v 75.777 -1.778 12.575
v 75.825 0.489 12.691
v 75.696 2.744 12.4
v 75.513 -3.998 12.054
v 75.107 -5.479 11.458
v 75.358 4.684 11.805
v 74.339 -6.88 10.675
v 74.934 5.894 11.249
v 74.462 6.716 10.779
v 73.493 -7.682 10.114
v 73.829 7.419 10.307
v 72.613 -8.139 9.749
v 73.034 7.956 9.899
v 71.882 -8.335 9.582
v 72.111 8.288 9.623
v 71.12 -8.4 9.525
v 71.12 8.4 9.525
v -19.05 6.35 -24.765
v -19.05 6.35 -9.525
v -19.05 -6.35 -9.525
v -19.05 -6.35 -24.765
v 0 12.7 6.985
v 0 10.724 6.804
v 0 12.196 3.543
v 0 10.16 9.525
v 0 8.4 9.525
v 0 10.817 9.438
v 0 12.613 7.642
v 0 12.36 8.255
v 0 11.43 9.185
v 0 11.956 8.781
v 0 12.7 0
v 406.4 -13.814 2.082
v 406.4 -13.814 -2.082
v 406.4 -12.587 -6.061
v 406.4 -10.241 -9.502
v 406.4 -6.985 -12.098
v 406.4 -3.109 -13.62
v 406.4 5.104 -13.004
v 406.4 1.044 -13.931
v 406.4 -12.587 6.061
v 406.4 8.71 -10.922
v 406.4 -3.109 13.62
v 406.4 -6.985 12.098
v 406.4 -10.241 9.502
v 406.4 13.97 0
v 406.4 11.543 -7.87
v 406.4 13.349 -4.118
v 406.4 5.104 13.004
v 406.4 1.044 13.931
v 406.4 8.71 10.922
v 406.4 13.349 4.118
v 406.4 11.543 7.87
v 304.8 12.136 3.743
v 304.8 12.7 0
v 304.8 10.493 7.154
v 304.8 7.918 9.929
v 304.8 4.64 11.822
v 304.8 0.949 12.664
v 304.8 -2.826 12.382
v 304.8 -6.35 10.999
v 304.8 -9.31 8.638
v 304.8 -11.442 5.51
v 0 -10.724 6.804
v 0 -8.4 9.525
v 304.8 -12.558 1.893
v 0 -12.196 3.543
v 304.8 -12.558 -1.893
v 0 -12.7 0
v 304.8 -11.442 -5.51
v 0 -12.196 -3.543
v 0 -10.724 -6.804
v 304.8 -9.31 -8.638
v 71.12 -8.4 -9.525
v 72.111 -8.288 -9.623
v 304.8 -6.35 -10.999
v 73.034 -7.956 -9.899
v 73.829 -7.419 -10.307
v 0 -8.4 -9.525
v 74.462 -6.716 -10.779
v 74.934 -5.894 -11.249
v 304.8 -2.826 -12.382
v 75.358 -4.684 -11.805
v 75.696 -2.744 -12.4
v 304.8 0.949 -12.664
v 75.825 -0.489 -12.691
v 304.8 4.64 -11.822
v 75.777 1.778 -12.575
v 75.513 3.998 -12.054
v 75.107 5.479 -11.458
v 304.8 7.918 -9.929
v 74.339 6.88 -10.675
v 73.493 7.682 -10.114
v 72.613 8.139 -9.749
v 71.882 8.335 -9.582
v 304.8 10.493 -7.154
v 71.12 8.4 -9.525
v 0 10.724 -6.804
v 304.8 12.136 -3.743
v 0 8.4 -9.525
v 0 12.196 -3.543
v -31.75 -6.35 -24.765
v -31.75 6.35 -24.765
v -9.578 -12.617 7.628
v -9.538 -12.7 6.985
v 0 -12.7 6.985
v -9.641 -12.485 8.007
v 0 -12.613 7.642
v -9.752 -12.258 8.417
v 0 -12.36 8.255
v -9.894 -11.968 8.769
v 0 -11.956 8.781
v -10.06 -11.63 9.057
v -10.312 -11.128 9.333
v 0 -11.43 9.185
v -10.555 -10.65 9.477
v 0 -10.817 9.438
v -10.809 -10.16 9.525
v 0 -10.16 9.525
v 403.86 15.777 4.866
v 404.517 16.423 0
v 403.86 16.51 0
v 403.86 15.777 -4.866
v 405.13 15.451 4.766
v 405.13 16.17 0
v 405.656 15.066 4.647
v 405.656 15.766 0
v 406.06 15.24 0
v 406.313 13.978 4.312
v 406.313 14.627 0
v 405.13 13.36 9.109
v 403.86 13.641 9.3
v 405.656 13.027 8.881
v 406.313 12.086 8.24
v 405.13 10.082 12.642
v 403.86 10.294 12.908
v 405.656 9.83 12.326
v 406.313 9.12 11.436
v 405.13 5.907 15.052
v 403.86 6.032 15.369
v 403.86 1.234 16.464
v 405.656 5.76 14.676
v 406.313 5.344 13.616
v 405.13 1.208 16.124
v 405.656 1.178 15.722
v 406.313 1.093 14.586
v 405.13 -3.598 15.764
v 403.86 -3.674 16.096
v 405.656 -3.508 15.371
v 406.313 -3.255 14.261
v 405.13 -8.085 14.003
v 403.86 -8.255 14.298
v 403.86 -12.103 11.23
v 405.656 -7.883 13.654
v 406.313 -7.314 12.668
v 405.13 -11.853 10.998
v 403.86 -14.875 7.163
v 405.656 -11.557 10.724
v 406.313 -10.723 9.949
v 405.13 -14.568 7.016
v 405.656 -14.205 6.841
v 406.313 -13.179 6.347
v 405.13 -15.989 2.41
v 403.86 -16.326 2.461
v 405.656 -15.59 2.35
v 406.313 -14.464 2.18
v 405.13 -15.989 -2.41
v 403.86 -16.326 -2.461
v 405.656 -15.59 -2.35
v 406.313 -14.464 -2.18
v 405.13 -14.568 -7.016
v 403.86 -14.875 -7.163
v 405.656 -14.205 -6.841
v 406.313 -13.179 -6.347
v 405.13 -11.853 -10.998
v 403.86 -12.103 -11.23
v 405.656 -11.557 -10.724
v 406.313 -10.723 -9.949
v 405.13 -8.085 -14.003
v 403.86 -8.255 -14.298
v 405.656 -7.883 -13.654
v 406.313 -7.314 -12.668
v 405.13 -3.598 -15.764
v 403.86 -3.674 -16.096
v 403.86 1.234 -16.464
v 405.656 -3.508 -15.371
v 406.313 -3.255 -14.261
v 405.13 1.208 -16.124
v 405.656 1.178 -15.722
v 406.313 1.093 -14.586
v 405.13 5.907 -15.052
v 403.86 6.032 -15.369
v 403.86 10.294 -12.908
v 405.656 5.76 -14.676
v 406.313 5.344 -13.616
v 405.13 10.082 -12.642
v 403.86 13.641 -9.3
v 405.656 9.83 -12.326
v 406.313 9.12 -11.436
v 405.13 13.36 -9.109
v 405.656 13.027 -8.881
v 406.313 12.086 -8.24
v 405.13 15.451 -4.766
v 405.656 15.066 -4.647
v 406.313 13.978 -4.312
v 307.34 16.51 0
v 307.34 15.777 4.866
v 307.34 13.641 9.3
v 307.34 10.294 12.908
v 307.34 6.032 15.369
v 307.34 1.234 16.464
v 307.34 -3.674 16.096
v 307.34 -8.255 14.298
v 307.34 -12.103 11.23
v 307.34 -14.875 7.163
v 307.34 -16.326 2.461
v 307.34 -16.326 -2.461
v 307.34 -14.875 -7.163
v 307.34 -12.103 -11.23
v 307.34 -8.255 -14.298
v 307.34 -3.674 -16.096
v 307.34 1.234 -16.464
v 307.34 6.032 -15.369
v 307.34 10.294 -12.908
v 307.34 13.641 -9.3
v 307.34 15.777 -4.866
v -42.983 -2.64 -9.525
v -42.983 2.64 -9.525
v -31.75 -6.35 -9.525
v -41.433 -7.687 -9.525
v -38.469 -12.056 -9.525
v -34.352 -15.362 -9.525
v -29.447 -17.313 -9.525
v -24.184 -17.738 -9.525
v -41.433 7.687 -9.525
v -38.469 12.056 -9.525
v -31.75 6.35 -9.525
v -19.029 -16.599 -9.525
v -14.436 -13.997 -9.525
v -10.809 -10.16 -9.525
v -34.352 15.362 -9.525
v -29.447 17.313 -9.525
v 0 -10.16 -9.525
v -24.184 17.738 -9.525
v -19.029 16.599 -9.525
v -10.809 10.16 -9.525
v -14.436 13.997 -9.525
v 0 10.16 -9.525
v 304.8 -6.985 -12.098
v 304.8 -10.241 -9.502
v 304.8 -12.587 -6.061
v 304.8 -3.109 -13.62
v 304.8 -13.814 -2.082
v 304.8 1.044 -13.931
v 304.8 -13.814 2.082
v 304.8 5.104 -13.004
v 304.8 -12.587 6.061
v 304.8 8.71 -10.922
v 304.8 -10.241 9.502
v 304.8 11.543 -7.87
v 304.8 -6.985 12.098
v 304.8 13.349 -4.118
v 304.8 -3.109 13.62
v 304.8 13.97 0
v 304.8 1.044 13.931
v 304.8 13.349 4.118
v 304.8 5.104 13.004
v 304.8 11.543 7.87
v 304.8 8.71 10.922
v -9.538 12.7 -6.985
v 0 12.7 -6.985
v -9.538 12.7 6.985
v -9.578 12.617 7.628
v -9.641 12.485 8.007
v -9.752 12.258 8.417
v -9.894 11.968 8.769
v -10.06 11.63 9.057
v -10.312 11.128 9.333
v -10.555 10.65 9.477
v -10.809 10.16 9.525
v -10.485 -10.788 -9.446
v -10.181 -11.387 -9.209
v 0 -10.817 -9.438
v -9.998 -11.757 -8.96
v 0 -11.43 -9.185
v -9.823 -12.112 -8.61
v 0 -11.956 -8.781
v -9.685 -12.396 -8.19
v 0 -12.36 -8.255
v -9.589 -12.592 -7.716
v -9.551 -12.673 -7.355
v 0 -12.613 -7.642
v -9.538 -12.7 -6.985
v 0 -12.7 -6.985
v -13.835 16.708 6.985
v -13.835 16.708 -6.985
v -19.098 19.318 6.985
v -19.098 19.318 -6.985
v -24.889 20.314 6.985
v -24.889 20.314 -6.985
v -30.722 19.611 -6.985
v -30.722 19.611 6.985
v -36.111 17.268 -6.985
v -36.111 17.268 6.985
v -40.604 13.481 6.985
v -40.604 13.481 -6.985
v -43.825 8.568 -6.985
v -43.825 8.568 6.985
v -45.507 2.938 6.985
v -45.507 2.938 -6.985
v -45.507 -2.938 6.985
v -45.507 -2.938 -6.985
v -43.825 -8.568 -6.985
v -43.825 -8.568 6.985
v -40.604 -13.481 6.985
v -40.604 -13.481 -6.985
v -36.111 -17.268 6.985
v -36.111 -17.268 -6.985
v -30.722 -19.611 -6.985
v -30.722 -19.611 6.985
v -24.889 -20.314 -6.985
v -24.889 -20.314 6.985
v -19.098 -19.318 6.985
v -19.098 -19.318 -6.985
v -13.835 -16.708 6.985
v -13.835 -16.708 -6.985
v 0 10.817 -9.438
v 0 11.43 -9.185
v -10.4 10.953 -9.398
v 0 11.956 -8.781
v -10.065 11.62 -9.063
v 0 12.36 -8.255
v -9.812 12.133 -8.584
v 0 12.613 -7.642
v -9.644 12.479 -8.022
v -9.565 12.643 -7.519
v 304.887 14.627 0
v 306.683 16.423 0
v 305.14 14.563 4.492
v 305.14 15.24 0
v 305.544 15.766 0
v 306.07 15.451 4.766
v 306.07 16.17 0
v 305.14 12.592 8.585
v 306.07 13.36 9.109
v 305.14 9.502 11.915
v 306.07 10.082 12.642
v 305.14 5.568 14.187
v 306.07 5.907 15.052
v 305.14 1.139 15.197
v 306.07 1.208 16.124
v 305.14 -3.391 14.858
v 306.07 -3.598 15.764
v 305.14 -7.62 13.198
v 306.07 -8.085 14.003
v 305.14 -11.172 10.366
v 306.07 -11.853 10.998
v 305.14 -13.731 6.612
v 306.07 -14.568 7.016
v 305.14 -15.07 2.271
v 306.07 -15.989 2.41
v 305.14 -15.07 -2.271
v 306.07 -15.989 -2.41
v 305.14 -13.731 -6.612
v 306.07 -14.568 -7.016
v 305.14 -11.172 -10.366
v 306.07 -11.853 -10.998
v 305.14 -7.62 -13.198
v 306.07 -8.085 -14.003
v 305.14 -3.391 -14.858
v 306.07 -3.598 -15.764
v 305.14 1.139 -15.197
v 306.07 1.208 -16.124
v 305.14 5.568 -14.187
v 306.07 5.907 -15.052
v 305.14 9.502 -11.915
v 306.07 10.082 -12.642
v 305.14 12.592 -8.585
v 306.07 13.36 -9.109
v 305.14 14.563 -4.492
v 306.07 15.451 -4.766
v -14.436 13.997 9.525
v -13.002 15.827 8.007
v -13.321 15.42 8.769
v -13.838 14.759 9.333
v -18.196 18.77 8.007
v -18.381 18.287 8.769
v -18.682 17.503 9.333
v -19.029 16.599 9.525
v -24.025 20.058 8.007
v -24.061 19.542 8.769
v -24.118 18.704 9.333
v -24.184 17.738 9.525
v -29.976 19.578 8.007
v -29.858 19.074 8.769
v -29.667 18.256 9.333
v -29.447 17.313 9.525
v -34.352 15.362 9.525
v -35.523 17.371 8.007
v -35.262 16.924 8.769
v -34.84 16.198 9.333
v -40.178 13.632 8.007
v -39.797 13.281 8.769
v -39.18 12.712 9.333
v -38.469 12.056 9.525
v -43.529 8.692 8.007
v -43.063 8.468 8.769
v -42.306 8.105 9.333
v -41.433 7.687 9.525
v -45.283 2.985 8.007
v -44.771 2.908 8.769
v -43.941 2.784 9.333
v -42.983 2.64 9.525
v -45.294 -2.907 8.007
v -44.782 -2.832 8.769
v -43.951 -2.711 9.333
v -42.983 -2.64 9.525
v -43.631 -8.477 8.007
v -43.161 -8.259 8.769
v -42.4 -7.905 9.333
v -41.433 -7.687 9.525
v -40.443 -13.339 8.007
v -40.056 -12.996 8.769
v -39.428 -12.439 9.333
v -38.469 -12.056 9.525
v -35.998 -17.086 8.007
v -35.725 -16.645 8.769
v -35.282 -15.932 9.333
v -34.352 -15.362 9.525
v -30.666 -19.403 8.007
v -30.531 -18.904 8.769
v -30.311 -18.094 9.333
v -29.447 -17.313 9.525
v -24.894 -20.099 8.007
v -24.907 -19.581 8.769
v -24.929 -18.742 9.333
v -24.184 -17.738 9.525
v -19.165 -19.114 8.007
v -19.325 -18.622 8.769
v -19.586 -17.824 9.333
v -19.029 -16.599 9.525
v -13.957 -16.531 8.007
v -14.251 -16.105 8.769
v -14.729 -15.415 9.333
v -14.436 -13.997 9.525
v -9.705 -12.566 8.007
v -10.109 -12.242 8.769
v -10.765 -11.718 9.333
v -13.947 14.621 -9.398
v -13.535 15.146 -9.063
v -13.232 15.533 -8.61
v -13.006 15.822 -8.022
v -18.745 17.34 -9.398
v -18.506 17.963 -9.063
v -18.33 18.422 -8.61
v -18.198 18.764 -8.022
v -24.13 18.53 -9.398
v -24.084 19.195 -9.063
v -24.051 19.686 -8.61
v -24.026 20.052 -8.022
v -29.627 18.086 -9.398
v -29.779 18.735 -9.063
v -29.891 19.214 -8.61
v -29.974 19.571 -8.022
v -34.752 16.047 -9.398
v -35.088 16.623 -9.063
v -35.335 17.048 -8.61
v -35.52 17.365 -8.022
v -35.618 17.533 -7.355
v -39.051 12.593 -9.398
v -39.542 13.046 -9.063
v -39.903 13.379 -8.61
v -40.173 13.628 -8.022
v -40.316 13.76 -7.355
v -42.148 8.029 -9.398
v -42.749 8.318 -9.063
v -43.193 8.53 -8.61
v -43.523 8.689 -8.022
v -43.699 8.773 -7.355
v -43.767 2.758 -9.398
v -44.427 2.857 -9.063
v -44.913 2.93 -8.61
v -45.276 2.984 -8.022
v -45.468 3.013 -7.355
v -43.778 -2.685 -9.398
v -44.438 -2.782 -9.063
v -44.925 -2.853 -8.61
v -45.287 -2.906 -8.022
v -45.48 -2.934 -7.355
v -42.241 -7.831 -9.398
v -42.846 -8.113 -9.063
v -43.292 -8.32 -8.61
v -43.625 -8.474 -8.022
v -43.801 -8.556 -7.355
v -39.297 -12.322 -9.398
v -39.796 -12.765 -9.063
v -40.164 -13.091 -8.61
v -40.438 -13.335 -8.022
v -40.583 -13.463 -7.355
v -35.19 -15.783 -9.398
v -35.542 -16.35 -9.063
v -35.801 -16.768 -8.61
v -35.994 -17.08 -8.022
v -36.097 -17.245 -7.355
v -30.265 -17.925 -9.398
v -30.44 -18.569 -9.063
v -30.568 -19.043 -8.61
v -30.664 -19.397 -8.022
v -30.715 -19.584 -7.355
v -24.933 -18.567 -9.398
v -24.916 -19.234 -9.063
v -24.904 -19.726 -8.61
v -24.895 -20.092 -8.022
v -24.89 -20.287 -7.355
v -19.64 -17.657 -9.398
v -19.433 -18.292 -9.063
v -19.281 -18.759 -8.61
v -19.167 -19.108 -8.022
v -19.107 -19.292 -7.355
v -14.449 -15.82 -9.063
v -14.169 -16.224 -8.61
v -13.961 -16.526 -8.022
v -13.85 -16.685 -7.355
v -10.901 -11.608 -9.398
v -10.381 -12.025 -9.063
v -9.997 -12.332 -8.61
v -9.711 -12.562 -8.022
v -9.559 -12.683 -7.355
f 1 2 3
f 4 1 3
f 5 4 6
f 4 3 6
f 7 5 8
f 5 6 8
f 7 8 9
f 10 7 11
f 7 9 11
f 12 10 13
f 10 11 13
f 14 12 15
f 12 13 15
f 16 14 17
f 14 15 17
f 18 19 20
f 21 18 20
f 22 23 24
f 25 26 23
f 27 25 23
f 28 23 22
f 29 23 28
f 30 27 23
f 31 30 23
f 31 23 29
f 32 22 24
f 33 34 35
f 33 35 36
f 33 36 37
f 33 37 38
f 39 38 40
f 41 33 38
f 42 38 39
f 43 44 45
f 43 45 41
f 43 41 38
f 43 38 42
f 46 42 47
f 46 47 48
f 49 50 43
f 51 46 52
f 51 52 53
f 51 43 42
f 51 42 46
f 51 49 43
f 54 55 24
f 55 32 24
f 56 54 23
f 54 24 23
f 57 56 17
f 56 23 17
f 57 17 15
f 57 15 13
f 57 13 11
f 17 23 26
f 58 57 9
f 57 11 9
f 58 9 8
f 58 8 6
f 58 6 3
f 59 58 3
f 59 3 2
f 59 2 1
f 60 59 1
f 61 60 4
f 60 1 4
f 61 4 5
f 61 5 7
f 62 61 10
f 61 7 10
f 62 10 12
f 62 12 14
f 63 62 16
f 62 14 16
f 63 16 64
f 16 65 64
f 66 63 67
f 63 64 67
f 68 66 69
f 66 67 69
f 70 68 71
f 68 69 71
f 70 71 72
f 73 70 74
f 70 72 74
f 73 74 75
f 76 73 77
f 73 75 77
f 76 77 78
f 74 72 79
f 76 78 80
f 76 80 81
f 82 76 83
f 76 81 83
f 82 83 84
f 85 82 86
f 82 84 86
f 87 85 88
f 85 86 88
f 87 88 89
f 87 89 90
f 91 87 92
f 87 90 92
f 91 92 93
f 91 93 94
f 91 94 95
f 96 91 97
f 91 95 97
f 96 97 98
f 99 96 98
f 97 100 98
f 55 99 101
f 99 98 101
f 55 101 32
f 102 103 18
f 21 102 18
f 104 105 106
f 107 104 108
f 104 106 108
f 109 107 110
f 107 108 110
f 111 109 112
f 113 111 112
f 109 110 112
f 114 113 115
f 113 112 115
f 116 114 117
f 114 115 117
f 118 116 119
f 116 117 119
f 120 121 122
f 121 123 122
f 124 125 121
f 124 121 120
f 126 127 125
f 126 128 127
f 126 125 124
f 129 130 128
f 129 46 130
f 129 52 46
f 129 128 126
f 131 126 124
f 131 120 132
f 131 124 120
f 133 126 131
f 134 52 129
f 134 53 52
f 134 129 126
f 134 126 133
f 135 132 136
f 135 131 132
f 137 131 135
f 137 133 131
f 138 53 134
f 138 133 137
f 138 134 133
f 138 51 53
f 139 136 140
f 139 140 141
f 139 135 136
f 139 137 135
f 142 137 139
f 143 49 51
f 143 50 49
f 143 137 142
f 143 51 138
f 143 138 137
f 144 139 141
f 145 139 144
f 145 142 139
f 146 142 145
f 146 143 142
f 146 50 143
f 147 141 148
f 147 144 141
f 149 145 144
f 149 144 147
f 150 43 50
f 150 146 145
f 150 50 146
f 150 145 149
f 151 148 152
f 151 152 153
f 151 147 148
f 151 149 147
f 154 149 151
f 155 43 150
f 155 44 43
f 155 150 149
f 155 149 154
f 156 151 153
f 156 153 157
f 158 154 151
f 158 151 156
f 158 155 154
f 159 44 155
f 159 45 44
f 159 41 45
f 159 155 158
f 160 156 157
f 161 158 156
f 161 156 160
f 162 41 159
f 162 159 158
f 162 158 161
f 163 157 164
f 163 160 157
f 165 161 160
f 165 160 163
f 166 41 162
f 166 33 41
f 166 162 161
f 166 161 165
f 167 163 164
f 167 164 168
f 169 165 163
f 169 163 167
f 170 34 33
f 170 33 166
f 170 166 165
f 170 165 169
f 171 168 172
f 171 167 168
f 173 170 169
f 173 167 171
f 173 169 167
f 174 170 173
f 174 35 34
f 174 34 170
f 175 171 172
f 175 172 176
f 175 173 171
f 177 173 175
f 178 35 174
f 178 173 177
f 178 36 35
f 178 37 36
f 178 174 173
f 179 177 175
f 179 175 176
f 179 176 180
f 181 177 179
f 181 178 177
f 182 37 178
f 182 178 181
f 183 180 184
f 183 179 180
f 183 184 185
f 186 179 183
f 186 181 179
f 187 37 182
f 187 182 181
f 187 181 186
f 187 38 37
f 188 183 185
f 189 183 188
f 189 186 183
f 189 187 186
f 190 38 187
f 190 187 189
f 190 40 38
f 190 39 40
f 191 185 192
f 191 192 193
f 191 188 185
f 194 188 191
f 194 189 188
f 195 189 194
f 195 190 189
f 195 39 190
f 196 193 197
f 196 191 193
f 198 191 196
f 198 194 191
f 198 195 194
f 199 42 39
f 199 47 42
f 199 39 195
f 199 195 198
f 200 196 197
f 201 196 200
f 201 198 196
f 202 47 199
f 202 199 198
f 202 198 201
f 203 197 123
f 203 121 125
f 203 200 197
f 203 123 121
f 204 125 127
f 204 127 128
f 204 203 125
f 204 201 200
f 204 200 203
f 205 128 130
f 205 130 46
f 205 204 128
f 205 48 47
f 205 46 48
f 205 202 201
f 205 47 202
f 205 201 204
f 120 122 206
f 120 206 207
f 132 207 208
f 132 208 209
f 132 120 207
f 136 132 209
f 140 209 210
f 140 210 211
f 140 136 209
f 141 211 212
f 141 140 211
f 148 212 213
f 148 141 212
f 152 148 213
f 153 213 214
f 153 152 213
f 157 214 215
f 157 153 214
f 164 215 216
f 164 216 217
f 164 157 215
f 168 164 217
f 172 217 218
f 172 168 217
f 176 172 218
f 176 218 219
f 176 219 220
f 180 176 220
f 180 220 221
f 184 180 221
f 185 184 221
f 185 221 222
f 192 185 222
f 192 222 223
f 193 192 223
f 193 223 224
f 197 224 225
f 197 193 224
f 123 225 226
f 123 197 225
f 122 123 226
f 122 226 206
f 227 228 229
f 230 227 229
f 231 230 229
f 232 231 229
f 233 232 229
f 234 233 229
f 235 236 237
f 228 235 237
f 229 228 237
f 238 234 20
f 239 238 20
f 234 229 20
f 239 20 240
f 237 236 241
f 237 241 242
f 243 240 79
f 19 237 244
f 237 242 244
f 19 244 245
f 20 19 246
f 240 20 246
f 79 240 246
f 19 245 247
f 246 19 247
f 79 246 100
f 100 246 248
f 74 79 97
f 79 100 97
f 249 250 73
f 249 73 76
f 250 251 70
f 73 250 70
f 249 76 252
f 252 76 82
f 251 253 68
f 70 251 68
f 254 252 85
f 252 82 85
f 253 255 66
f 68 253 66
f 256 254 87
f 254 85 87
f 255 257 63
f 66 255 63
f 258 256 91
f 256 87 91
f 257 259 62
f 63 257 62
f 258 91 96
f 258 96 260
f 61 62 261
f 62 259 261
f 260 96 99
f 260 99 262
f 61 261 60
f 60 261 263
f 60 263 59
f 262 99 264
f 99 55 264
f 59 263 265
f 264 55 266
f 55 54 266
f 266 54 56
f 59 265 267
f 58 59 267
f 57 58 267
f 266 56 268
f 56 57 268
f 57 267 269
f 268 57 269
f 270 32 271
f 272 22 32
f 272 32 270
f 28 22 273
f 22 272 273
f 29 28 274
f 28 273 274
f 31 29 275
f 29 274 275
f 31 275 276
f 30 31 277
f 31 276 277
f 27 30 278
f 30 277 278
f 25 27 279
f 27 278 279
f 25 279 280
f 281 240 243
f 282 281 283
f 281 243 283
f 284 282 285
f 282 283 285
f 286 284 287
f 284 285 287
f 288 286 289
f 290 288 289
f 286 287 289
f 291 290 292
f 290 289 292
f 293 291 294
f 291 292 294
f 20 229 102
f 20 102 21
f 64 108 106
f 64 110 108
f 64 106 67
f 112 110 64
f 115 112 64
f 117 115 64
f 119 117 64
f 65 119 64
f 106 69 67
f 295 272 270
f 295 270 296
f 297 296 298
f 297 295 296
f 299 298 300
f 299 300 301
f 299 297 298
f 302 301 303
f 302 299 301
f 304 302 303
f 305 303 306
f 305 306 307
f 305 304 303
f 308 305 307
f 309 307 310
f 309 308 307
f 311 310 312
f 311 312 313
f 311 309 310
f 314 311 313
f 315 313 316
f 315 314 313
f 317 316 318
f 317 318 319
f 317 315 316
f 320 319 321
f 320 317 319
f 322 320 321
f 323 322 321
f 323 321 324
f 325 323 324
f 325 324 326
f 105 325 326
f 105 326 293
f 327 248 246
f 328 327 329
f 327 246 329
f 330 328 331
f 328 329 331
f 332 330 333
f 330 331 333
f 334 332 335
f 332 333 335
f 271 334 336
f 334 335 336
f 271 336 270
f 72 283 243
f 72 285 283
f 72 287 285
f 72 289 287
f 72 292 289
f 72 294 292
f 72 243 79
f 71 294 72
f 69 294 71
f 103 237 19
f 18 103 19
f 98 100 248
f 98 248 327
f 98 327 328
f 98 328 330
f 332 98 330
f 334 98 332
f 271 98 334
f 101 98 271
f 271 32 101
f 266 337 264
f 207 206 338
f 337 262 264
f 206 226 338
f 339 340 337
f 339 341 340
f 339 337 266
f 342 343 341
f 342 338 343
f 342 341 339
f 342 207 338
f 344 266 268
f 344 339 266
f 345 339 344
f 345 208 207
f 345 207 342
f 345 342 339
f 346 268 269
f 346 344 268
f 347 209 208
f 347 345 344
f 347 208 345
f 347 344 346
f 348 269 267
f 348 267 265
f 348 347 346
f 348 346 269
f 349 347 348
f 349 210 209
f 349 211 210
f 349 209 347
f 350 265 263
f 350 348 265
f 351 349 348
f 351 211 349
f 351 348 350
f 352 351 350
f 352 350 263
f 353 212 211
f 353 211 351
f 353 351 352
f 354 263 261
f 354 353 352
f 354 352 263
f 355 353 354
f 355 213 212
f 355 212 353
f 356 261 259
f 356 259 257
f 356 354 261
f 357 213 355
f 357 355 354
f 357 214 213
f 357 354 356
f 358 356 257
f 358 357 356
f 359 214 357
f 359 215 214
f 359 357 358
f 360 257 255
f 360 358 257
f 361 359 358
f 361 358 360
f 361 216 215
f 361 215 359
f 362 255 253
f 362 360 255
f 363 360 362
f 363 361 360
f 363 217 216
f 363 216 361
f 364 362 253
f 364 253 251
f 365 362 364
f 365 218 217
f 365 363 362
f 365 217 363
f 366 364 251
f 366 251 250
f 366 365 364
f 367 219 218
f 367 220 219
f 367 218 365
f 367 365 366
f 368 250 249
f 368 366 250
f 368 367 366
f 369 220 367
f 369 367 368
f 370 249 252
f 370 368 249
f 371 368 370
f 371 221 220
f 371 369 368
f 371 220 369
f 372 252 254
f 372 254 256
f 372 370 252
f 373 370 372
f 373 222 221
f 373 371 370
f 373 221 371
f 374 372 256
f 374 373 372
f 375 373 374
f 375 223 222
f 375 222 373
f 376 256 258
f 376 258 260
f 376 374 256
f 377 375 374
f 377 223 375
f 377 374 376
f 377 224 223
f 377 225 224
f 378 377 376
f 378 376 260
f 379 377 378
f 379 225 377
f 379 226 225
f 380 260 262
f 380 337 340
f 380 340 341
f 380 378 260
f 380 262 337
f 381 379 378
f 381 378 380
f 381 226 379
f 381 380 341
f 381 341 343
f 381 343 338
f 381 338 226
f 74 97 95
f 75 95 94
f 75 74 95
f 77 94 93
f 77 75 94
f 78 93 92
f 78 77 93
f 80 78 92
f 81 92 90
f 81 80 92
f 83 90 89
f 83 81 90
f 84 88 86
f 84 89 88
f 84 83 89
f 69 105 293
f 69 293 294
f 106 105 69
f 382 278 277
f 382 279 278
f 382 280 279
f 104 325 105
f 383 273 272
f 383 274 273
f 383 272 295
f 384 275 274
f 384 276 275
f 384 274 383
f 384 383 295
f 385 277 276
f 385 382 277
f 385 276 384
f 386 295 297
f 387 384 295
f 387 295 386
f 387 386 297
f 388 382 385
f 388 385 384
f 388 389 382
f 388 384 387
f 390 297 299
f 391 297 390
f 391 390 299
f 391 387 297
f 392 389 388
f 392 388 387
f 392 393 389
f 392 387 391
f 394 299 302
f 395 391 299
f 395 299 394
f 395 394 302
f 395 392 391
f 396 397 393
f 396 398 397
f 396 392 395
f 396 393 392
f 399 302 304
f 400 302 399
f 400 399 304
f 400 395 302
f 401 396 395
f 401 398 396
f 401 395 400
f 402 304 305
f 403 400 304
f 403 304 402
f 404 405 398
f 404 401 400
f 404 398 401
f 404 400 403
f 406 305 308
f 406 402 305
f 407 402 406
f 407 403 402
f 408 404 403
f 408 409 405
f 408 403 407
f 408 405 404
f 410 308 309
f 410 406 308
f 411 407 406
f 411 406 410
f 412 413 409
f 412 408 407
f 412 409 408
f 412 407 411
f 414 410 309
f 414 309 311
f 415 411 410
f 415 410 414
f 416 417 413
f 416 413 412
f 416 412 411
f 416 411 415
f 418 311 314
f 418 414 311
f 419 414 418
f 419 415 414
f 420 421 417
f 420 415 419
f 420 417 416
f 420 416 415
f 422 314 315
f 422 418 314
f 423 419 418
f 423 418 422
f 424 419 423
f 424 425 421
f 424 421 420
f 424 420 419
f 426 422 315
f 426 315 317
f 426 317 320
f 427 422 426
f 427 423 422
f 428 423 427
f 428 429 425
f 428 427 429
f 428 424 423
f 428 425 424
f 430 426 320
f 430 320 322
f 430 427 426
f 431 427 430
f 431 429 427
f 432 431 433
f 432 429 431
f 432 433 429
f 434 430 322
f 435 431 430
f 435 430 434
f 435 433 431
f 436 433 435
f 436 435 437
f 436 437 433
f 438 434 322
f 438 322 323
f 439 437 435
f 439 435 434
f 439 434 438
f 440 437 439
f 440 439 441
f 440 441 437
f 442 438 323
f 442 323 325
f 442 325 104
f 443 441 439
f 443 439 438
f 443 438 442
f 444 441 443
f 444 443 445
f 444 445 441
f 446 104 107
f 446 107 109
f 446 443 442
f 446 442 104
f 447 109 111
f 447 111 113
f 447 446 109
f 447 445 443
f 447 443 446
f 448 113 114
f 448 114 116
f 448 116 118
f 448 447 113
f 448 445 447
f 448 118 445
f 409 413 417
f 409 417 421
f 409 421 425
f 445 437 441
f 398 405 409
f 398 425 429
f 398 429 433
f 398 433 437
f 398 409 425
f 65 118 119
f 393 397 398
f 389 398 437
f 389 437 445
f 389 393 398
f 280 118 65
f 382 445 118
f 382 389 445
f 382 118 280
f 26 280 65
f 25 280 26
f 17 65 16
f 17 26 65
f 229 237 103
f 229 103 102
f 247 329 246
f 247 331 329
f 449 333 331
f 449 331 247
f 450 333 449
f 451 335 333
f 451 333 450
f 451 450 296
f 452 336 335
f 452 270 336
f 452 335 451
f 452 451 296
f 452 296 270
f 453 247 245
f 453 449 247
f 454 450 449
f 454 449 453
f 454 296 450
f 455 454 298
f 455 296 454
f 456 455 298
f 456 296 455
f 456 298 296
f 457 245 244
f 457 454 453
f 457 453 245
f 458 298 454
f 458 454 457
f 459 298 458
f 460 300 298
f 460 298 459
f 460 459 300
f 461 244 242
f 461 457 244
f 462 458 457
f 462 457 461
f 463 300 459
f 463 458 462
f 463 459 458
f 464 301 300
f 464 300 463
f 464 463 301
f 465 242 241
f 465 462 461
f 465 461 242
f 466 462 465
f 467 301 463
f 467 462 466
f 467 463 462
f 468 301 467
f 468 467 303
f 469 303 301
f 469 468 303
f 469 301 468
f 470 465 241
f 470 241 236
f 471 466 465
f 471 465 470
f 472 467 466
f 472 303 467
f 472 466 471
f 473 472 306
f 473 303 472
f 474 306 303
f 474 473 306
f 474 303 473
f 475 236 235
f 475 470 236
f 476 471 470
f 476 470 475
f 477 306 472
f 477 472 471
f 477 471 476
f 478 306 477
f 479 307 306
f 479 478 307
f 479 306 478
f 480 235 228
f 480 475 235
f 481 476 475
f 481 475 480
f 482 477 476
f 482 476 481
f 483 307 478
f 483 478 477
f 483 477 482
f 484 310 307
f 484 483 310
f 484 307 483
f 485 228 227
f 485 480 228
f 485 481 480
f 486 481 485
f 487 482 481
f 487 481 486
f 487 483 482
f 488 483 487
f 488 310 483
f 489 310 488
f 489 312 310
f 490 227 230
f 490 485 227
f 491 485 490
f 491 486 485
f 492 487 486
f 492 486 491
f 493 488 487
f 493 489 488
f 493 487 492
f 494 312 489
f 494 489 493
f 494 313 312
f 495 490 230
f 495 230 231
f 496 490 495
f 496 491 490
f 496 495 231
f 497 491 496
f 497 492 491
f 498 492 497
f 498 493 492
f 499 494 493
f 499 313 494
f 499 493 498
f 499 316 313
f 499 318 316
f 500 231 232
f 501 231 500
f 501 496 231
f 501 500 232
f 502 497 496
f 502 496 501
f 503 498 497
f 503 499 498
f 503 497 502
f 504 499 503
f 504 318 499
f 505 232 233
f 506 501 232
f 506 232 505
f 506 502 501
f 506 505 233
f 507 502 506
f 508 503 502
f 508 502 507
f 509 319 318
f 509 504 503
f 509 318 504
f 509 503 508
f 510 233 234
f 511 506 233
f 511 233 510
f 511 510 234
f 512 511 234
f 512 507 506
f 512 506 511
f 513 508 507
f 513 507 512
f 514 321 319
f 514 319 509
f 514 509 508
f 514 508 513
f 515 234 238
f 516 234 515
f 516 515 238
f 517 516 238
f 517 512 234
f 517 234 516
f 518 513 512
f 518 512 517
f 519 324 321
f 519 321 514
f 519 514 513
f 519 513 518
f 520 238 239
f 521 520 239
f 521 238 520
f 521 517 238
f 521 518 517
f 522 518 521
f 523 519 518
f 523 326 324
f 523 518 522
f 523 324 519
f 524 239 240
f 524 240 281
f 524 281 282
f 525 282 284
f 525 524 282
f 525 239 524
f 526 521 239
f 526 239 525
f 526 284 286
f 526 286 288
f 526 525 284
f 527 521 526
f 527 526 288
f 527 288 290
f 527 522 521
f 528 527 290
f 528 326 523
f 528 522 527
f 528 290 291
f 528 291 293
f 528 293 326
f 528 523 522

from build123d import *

# Parameters (mm, degrees)
F0_R        = 12.7
F1_DEPTH    = 406.4
F2_R        = 16.51
F3_DEPTH    = 101.6
F5_DEPTH    = 9.525
F6_W        = 76.2
F6_H        = 3.175
F7_DEPTH    = 12.7
F8_T4_DEPTH = 42.2005208253
F8_S5_R     = 12.7
F8_T6_DEPTH = 23
F9_T4_DEPTH = 42.2005208253
F9_S5_R     = 12.7
F9_T6_DEPTH = 23
F10_R       = 2.54
F11_W       = 12.7
F11_H       = 12.7
F12_DEPTH   = 15.24


# Not quite as in the source:
# - a fillet or chamfer that OpenCascade refuses, or shapes differently, is made with other operations: its cross-section is extruded or revolved along the edge and cut away or added


with BuildPart() as f1:
    # F0 (on Right) → F1 (new body)
    with BuildSketch(Plane.YZ):
        Circle(F0_R)
    extrude(amount=F1_DEPTH)

    # F2 (on face) → F3 (join)
    with BuildSketch(Plane.YZ.offset(406.4)):
        Circle(F2_R)
    extrude(amount=-F3_DEPTH)

    # F4 (on Top) → F5 (join, symmetric)
    with BuildSketch(Plane.XY):
        with BuildLine():
            Line((0, 12.7), (-9.5377050841, 12.7))
            ThreePointArc((-9.5377050841, 12.7), (-45.72, 0), (-9.5377050841, -12.7))
            Line((-9.5377050841, -12.7), (0, -12.7))
            Line((0, -12.7), (0, 12.7))
        make_face()
    extrude(amount=F5_DEPTH, both=True)

    # F6 (on Front) → F7 (cut, symmetric)
    with BuildSketch(Plane.XZ):
        with Locations((38.1, 11.1125)):
            Rectangle(F6_W, F6_H)
        with Locations((38.1, -11.1125)):
            Rectangle(F6_W, F6_H)
    extrude(amount=F7_DEPTH, both=True, mode=Mode.SUBTRACT)

    # F8: fillet of radius 5.08 on 1 edges, made by hand


with BuildPart() as f8_tool2:
    # F8_s3 → F8_t4 (new body)
    with BuildSketch(Plane.XZ.offset(-21.1002604126)):
        with BuildLine():
            ThreePointArc((76.2, 14.605), (74.7121024484, 11.0128975516), (71.12, 9.525))
            Line((71.12, 9.525), (76.2, 9.525))
            Line((76.2, 9.525), (76.2, 14.605))
        make_face()
    extrude(amount=F8_T4_DEPTH)

    # F8_s5 → F8_t6 (intersect, symmetric)
    with BuildSketch(Plane.YZ.offset(73.7)):
        Circle(F8_S5_R)
    extrude(amount=F8_T6_DEPTH, both=True, mode=Mode.INTERSECT)


with BuildPart() as f1_1:
    add(f1.part)

    # F8_t1: union F8_tool2
    add(f8_tool2.part)

    # F9: fillet of radius 5.08 on 1 edges, made by hand


with BuildPart() as f9_tool2:
    # F9_s3 → F9_t4 (new body)
    with BuildSketch(Plane.XZ.offset(21.1002604126)):
        with BuildLine():
            ThreePointArc((71.12, -9.525), (74.7121024484, -11.0128975516), (76.2, -14.605))
            Line((76.2, -14.605), (76.2, -9.525))
            Line((76.2, -9.525), (71.12, -9.525))
        make_face()
    extrude(amount=-F9_T4_DEPTH)

    # F9_s5 → F9_t6 (intersect, symmetric)
    with BuildSketch(Plane.YZ.offset(73.7)):
        Circle(F9_S5_R)
    extrude(amount=F9_T6_DEPTH, both=True, mode=Mode.INTERSECT)


with BuildPart() as f1_2:
    add(f1_1.part)

    # F9_t1: union F9_tool2
    add(f9_tool2.part)

    # F10
    f10_edges = [f1_2.edges().sort_by_distance(p)[0] for p in [
        (-45.72, 0, -9.525),
        (-45.72, 0, 9.525),
        (-4.768853, -12.7, -9.525),
        (-4.768853, -12.7, 9.525),
        (-4.768853, 12.7, -9.525),
        (-4.768853, 12.7, 9.525),
        (406.4, -16.51, 0),
        (304.8, -16.51, 0),
    ]]
    fillet(f10_edges, radius=F10_R)

    # F11 (on face) → F12 (join)
    with BuildSketch(Plane(origin=(0, 0, -9.525), x_dir=(1, 0, 0), z_dir=(0, 0, -1))):
        with Locations((-25.4, 0)):
            Rectangle(F11_W, F11_H)
    extrude(amount=F12_DEPTH)


solid = f1_2.part
